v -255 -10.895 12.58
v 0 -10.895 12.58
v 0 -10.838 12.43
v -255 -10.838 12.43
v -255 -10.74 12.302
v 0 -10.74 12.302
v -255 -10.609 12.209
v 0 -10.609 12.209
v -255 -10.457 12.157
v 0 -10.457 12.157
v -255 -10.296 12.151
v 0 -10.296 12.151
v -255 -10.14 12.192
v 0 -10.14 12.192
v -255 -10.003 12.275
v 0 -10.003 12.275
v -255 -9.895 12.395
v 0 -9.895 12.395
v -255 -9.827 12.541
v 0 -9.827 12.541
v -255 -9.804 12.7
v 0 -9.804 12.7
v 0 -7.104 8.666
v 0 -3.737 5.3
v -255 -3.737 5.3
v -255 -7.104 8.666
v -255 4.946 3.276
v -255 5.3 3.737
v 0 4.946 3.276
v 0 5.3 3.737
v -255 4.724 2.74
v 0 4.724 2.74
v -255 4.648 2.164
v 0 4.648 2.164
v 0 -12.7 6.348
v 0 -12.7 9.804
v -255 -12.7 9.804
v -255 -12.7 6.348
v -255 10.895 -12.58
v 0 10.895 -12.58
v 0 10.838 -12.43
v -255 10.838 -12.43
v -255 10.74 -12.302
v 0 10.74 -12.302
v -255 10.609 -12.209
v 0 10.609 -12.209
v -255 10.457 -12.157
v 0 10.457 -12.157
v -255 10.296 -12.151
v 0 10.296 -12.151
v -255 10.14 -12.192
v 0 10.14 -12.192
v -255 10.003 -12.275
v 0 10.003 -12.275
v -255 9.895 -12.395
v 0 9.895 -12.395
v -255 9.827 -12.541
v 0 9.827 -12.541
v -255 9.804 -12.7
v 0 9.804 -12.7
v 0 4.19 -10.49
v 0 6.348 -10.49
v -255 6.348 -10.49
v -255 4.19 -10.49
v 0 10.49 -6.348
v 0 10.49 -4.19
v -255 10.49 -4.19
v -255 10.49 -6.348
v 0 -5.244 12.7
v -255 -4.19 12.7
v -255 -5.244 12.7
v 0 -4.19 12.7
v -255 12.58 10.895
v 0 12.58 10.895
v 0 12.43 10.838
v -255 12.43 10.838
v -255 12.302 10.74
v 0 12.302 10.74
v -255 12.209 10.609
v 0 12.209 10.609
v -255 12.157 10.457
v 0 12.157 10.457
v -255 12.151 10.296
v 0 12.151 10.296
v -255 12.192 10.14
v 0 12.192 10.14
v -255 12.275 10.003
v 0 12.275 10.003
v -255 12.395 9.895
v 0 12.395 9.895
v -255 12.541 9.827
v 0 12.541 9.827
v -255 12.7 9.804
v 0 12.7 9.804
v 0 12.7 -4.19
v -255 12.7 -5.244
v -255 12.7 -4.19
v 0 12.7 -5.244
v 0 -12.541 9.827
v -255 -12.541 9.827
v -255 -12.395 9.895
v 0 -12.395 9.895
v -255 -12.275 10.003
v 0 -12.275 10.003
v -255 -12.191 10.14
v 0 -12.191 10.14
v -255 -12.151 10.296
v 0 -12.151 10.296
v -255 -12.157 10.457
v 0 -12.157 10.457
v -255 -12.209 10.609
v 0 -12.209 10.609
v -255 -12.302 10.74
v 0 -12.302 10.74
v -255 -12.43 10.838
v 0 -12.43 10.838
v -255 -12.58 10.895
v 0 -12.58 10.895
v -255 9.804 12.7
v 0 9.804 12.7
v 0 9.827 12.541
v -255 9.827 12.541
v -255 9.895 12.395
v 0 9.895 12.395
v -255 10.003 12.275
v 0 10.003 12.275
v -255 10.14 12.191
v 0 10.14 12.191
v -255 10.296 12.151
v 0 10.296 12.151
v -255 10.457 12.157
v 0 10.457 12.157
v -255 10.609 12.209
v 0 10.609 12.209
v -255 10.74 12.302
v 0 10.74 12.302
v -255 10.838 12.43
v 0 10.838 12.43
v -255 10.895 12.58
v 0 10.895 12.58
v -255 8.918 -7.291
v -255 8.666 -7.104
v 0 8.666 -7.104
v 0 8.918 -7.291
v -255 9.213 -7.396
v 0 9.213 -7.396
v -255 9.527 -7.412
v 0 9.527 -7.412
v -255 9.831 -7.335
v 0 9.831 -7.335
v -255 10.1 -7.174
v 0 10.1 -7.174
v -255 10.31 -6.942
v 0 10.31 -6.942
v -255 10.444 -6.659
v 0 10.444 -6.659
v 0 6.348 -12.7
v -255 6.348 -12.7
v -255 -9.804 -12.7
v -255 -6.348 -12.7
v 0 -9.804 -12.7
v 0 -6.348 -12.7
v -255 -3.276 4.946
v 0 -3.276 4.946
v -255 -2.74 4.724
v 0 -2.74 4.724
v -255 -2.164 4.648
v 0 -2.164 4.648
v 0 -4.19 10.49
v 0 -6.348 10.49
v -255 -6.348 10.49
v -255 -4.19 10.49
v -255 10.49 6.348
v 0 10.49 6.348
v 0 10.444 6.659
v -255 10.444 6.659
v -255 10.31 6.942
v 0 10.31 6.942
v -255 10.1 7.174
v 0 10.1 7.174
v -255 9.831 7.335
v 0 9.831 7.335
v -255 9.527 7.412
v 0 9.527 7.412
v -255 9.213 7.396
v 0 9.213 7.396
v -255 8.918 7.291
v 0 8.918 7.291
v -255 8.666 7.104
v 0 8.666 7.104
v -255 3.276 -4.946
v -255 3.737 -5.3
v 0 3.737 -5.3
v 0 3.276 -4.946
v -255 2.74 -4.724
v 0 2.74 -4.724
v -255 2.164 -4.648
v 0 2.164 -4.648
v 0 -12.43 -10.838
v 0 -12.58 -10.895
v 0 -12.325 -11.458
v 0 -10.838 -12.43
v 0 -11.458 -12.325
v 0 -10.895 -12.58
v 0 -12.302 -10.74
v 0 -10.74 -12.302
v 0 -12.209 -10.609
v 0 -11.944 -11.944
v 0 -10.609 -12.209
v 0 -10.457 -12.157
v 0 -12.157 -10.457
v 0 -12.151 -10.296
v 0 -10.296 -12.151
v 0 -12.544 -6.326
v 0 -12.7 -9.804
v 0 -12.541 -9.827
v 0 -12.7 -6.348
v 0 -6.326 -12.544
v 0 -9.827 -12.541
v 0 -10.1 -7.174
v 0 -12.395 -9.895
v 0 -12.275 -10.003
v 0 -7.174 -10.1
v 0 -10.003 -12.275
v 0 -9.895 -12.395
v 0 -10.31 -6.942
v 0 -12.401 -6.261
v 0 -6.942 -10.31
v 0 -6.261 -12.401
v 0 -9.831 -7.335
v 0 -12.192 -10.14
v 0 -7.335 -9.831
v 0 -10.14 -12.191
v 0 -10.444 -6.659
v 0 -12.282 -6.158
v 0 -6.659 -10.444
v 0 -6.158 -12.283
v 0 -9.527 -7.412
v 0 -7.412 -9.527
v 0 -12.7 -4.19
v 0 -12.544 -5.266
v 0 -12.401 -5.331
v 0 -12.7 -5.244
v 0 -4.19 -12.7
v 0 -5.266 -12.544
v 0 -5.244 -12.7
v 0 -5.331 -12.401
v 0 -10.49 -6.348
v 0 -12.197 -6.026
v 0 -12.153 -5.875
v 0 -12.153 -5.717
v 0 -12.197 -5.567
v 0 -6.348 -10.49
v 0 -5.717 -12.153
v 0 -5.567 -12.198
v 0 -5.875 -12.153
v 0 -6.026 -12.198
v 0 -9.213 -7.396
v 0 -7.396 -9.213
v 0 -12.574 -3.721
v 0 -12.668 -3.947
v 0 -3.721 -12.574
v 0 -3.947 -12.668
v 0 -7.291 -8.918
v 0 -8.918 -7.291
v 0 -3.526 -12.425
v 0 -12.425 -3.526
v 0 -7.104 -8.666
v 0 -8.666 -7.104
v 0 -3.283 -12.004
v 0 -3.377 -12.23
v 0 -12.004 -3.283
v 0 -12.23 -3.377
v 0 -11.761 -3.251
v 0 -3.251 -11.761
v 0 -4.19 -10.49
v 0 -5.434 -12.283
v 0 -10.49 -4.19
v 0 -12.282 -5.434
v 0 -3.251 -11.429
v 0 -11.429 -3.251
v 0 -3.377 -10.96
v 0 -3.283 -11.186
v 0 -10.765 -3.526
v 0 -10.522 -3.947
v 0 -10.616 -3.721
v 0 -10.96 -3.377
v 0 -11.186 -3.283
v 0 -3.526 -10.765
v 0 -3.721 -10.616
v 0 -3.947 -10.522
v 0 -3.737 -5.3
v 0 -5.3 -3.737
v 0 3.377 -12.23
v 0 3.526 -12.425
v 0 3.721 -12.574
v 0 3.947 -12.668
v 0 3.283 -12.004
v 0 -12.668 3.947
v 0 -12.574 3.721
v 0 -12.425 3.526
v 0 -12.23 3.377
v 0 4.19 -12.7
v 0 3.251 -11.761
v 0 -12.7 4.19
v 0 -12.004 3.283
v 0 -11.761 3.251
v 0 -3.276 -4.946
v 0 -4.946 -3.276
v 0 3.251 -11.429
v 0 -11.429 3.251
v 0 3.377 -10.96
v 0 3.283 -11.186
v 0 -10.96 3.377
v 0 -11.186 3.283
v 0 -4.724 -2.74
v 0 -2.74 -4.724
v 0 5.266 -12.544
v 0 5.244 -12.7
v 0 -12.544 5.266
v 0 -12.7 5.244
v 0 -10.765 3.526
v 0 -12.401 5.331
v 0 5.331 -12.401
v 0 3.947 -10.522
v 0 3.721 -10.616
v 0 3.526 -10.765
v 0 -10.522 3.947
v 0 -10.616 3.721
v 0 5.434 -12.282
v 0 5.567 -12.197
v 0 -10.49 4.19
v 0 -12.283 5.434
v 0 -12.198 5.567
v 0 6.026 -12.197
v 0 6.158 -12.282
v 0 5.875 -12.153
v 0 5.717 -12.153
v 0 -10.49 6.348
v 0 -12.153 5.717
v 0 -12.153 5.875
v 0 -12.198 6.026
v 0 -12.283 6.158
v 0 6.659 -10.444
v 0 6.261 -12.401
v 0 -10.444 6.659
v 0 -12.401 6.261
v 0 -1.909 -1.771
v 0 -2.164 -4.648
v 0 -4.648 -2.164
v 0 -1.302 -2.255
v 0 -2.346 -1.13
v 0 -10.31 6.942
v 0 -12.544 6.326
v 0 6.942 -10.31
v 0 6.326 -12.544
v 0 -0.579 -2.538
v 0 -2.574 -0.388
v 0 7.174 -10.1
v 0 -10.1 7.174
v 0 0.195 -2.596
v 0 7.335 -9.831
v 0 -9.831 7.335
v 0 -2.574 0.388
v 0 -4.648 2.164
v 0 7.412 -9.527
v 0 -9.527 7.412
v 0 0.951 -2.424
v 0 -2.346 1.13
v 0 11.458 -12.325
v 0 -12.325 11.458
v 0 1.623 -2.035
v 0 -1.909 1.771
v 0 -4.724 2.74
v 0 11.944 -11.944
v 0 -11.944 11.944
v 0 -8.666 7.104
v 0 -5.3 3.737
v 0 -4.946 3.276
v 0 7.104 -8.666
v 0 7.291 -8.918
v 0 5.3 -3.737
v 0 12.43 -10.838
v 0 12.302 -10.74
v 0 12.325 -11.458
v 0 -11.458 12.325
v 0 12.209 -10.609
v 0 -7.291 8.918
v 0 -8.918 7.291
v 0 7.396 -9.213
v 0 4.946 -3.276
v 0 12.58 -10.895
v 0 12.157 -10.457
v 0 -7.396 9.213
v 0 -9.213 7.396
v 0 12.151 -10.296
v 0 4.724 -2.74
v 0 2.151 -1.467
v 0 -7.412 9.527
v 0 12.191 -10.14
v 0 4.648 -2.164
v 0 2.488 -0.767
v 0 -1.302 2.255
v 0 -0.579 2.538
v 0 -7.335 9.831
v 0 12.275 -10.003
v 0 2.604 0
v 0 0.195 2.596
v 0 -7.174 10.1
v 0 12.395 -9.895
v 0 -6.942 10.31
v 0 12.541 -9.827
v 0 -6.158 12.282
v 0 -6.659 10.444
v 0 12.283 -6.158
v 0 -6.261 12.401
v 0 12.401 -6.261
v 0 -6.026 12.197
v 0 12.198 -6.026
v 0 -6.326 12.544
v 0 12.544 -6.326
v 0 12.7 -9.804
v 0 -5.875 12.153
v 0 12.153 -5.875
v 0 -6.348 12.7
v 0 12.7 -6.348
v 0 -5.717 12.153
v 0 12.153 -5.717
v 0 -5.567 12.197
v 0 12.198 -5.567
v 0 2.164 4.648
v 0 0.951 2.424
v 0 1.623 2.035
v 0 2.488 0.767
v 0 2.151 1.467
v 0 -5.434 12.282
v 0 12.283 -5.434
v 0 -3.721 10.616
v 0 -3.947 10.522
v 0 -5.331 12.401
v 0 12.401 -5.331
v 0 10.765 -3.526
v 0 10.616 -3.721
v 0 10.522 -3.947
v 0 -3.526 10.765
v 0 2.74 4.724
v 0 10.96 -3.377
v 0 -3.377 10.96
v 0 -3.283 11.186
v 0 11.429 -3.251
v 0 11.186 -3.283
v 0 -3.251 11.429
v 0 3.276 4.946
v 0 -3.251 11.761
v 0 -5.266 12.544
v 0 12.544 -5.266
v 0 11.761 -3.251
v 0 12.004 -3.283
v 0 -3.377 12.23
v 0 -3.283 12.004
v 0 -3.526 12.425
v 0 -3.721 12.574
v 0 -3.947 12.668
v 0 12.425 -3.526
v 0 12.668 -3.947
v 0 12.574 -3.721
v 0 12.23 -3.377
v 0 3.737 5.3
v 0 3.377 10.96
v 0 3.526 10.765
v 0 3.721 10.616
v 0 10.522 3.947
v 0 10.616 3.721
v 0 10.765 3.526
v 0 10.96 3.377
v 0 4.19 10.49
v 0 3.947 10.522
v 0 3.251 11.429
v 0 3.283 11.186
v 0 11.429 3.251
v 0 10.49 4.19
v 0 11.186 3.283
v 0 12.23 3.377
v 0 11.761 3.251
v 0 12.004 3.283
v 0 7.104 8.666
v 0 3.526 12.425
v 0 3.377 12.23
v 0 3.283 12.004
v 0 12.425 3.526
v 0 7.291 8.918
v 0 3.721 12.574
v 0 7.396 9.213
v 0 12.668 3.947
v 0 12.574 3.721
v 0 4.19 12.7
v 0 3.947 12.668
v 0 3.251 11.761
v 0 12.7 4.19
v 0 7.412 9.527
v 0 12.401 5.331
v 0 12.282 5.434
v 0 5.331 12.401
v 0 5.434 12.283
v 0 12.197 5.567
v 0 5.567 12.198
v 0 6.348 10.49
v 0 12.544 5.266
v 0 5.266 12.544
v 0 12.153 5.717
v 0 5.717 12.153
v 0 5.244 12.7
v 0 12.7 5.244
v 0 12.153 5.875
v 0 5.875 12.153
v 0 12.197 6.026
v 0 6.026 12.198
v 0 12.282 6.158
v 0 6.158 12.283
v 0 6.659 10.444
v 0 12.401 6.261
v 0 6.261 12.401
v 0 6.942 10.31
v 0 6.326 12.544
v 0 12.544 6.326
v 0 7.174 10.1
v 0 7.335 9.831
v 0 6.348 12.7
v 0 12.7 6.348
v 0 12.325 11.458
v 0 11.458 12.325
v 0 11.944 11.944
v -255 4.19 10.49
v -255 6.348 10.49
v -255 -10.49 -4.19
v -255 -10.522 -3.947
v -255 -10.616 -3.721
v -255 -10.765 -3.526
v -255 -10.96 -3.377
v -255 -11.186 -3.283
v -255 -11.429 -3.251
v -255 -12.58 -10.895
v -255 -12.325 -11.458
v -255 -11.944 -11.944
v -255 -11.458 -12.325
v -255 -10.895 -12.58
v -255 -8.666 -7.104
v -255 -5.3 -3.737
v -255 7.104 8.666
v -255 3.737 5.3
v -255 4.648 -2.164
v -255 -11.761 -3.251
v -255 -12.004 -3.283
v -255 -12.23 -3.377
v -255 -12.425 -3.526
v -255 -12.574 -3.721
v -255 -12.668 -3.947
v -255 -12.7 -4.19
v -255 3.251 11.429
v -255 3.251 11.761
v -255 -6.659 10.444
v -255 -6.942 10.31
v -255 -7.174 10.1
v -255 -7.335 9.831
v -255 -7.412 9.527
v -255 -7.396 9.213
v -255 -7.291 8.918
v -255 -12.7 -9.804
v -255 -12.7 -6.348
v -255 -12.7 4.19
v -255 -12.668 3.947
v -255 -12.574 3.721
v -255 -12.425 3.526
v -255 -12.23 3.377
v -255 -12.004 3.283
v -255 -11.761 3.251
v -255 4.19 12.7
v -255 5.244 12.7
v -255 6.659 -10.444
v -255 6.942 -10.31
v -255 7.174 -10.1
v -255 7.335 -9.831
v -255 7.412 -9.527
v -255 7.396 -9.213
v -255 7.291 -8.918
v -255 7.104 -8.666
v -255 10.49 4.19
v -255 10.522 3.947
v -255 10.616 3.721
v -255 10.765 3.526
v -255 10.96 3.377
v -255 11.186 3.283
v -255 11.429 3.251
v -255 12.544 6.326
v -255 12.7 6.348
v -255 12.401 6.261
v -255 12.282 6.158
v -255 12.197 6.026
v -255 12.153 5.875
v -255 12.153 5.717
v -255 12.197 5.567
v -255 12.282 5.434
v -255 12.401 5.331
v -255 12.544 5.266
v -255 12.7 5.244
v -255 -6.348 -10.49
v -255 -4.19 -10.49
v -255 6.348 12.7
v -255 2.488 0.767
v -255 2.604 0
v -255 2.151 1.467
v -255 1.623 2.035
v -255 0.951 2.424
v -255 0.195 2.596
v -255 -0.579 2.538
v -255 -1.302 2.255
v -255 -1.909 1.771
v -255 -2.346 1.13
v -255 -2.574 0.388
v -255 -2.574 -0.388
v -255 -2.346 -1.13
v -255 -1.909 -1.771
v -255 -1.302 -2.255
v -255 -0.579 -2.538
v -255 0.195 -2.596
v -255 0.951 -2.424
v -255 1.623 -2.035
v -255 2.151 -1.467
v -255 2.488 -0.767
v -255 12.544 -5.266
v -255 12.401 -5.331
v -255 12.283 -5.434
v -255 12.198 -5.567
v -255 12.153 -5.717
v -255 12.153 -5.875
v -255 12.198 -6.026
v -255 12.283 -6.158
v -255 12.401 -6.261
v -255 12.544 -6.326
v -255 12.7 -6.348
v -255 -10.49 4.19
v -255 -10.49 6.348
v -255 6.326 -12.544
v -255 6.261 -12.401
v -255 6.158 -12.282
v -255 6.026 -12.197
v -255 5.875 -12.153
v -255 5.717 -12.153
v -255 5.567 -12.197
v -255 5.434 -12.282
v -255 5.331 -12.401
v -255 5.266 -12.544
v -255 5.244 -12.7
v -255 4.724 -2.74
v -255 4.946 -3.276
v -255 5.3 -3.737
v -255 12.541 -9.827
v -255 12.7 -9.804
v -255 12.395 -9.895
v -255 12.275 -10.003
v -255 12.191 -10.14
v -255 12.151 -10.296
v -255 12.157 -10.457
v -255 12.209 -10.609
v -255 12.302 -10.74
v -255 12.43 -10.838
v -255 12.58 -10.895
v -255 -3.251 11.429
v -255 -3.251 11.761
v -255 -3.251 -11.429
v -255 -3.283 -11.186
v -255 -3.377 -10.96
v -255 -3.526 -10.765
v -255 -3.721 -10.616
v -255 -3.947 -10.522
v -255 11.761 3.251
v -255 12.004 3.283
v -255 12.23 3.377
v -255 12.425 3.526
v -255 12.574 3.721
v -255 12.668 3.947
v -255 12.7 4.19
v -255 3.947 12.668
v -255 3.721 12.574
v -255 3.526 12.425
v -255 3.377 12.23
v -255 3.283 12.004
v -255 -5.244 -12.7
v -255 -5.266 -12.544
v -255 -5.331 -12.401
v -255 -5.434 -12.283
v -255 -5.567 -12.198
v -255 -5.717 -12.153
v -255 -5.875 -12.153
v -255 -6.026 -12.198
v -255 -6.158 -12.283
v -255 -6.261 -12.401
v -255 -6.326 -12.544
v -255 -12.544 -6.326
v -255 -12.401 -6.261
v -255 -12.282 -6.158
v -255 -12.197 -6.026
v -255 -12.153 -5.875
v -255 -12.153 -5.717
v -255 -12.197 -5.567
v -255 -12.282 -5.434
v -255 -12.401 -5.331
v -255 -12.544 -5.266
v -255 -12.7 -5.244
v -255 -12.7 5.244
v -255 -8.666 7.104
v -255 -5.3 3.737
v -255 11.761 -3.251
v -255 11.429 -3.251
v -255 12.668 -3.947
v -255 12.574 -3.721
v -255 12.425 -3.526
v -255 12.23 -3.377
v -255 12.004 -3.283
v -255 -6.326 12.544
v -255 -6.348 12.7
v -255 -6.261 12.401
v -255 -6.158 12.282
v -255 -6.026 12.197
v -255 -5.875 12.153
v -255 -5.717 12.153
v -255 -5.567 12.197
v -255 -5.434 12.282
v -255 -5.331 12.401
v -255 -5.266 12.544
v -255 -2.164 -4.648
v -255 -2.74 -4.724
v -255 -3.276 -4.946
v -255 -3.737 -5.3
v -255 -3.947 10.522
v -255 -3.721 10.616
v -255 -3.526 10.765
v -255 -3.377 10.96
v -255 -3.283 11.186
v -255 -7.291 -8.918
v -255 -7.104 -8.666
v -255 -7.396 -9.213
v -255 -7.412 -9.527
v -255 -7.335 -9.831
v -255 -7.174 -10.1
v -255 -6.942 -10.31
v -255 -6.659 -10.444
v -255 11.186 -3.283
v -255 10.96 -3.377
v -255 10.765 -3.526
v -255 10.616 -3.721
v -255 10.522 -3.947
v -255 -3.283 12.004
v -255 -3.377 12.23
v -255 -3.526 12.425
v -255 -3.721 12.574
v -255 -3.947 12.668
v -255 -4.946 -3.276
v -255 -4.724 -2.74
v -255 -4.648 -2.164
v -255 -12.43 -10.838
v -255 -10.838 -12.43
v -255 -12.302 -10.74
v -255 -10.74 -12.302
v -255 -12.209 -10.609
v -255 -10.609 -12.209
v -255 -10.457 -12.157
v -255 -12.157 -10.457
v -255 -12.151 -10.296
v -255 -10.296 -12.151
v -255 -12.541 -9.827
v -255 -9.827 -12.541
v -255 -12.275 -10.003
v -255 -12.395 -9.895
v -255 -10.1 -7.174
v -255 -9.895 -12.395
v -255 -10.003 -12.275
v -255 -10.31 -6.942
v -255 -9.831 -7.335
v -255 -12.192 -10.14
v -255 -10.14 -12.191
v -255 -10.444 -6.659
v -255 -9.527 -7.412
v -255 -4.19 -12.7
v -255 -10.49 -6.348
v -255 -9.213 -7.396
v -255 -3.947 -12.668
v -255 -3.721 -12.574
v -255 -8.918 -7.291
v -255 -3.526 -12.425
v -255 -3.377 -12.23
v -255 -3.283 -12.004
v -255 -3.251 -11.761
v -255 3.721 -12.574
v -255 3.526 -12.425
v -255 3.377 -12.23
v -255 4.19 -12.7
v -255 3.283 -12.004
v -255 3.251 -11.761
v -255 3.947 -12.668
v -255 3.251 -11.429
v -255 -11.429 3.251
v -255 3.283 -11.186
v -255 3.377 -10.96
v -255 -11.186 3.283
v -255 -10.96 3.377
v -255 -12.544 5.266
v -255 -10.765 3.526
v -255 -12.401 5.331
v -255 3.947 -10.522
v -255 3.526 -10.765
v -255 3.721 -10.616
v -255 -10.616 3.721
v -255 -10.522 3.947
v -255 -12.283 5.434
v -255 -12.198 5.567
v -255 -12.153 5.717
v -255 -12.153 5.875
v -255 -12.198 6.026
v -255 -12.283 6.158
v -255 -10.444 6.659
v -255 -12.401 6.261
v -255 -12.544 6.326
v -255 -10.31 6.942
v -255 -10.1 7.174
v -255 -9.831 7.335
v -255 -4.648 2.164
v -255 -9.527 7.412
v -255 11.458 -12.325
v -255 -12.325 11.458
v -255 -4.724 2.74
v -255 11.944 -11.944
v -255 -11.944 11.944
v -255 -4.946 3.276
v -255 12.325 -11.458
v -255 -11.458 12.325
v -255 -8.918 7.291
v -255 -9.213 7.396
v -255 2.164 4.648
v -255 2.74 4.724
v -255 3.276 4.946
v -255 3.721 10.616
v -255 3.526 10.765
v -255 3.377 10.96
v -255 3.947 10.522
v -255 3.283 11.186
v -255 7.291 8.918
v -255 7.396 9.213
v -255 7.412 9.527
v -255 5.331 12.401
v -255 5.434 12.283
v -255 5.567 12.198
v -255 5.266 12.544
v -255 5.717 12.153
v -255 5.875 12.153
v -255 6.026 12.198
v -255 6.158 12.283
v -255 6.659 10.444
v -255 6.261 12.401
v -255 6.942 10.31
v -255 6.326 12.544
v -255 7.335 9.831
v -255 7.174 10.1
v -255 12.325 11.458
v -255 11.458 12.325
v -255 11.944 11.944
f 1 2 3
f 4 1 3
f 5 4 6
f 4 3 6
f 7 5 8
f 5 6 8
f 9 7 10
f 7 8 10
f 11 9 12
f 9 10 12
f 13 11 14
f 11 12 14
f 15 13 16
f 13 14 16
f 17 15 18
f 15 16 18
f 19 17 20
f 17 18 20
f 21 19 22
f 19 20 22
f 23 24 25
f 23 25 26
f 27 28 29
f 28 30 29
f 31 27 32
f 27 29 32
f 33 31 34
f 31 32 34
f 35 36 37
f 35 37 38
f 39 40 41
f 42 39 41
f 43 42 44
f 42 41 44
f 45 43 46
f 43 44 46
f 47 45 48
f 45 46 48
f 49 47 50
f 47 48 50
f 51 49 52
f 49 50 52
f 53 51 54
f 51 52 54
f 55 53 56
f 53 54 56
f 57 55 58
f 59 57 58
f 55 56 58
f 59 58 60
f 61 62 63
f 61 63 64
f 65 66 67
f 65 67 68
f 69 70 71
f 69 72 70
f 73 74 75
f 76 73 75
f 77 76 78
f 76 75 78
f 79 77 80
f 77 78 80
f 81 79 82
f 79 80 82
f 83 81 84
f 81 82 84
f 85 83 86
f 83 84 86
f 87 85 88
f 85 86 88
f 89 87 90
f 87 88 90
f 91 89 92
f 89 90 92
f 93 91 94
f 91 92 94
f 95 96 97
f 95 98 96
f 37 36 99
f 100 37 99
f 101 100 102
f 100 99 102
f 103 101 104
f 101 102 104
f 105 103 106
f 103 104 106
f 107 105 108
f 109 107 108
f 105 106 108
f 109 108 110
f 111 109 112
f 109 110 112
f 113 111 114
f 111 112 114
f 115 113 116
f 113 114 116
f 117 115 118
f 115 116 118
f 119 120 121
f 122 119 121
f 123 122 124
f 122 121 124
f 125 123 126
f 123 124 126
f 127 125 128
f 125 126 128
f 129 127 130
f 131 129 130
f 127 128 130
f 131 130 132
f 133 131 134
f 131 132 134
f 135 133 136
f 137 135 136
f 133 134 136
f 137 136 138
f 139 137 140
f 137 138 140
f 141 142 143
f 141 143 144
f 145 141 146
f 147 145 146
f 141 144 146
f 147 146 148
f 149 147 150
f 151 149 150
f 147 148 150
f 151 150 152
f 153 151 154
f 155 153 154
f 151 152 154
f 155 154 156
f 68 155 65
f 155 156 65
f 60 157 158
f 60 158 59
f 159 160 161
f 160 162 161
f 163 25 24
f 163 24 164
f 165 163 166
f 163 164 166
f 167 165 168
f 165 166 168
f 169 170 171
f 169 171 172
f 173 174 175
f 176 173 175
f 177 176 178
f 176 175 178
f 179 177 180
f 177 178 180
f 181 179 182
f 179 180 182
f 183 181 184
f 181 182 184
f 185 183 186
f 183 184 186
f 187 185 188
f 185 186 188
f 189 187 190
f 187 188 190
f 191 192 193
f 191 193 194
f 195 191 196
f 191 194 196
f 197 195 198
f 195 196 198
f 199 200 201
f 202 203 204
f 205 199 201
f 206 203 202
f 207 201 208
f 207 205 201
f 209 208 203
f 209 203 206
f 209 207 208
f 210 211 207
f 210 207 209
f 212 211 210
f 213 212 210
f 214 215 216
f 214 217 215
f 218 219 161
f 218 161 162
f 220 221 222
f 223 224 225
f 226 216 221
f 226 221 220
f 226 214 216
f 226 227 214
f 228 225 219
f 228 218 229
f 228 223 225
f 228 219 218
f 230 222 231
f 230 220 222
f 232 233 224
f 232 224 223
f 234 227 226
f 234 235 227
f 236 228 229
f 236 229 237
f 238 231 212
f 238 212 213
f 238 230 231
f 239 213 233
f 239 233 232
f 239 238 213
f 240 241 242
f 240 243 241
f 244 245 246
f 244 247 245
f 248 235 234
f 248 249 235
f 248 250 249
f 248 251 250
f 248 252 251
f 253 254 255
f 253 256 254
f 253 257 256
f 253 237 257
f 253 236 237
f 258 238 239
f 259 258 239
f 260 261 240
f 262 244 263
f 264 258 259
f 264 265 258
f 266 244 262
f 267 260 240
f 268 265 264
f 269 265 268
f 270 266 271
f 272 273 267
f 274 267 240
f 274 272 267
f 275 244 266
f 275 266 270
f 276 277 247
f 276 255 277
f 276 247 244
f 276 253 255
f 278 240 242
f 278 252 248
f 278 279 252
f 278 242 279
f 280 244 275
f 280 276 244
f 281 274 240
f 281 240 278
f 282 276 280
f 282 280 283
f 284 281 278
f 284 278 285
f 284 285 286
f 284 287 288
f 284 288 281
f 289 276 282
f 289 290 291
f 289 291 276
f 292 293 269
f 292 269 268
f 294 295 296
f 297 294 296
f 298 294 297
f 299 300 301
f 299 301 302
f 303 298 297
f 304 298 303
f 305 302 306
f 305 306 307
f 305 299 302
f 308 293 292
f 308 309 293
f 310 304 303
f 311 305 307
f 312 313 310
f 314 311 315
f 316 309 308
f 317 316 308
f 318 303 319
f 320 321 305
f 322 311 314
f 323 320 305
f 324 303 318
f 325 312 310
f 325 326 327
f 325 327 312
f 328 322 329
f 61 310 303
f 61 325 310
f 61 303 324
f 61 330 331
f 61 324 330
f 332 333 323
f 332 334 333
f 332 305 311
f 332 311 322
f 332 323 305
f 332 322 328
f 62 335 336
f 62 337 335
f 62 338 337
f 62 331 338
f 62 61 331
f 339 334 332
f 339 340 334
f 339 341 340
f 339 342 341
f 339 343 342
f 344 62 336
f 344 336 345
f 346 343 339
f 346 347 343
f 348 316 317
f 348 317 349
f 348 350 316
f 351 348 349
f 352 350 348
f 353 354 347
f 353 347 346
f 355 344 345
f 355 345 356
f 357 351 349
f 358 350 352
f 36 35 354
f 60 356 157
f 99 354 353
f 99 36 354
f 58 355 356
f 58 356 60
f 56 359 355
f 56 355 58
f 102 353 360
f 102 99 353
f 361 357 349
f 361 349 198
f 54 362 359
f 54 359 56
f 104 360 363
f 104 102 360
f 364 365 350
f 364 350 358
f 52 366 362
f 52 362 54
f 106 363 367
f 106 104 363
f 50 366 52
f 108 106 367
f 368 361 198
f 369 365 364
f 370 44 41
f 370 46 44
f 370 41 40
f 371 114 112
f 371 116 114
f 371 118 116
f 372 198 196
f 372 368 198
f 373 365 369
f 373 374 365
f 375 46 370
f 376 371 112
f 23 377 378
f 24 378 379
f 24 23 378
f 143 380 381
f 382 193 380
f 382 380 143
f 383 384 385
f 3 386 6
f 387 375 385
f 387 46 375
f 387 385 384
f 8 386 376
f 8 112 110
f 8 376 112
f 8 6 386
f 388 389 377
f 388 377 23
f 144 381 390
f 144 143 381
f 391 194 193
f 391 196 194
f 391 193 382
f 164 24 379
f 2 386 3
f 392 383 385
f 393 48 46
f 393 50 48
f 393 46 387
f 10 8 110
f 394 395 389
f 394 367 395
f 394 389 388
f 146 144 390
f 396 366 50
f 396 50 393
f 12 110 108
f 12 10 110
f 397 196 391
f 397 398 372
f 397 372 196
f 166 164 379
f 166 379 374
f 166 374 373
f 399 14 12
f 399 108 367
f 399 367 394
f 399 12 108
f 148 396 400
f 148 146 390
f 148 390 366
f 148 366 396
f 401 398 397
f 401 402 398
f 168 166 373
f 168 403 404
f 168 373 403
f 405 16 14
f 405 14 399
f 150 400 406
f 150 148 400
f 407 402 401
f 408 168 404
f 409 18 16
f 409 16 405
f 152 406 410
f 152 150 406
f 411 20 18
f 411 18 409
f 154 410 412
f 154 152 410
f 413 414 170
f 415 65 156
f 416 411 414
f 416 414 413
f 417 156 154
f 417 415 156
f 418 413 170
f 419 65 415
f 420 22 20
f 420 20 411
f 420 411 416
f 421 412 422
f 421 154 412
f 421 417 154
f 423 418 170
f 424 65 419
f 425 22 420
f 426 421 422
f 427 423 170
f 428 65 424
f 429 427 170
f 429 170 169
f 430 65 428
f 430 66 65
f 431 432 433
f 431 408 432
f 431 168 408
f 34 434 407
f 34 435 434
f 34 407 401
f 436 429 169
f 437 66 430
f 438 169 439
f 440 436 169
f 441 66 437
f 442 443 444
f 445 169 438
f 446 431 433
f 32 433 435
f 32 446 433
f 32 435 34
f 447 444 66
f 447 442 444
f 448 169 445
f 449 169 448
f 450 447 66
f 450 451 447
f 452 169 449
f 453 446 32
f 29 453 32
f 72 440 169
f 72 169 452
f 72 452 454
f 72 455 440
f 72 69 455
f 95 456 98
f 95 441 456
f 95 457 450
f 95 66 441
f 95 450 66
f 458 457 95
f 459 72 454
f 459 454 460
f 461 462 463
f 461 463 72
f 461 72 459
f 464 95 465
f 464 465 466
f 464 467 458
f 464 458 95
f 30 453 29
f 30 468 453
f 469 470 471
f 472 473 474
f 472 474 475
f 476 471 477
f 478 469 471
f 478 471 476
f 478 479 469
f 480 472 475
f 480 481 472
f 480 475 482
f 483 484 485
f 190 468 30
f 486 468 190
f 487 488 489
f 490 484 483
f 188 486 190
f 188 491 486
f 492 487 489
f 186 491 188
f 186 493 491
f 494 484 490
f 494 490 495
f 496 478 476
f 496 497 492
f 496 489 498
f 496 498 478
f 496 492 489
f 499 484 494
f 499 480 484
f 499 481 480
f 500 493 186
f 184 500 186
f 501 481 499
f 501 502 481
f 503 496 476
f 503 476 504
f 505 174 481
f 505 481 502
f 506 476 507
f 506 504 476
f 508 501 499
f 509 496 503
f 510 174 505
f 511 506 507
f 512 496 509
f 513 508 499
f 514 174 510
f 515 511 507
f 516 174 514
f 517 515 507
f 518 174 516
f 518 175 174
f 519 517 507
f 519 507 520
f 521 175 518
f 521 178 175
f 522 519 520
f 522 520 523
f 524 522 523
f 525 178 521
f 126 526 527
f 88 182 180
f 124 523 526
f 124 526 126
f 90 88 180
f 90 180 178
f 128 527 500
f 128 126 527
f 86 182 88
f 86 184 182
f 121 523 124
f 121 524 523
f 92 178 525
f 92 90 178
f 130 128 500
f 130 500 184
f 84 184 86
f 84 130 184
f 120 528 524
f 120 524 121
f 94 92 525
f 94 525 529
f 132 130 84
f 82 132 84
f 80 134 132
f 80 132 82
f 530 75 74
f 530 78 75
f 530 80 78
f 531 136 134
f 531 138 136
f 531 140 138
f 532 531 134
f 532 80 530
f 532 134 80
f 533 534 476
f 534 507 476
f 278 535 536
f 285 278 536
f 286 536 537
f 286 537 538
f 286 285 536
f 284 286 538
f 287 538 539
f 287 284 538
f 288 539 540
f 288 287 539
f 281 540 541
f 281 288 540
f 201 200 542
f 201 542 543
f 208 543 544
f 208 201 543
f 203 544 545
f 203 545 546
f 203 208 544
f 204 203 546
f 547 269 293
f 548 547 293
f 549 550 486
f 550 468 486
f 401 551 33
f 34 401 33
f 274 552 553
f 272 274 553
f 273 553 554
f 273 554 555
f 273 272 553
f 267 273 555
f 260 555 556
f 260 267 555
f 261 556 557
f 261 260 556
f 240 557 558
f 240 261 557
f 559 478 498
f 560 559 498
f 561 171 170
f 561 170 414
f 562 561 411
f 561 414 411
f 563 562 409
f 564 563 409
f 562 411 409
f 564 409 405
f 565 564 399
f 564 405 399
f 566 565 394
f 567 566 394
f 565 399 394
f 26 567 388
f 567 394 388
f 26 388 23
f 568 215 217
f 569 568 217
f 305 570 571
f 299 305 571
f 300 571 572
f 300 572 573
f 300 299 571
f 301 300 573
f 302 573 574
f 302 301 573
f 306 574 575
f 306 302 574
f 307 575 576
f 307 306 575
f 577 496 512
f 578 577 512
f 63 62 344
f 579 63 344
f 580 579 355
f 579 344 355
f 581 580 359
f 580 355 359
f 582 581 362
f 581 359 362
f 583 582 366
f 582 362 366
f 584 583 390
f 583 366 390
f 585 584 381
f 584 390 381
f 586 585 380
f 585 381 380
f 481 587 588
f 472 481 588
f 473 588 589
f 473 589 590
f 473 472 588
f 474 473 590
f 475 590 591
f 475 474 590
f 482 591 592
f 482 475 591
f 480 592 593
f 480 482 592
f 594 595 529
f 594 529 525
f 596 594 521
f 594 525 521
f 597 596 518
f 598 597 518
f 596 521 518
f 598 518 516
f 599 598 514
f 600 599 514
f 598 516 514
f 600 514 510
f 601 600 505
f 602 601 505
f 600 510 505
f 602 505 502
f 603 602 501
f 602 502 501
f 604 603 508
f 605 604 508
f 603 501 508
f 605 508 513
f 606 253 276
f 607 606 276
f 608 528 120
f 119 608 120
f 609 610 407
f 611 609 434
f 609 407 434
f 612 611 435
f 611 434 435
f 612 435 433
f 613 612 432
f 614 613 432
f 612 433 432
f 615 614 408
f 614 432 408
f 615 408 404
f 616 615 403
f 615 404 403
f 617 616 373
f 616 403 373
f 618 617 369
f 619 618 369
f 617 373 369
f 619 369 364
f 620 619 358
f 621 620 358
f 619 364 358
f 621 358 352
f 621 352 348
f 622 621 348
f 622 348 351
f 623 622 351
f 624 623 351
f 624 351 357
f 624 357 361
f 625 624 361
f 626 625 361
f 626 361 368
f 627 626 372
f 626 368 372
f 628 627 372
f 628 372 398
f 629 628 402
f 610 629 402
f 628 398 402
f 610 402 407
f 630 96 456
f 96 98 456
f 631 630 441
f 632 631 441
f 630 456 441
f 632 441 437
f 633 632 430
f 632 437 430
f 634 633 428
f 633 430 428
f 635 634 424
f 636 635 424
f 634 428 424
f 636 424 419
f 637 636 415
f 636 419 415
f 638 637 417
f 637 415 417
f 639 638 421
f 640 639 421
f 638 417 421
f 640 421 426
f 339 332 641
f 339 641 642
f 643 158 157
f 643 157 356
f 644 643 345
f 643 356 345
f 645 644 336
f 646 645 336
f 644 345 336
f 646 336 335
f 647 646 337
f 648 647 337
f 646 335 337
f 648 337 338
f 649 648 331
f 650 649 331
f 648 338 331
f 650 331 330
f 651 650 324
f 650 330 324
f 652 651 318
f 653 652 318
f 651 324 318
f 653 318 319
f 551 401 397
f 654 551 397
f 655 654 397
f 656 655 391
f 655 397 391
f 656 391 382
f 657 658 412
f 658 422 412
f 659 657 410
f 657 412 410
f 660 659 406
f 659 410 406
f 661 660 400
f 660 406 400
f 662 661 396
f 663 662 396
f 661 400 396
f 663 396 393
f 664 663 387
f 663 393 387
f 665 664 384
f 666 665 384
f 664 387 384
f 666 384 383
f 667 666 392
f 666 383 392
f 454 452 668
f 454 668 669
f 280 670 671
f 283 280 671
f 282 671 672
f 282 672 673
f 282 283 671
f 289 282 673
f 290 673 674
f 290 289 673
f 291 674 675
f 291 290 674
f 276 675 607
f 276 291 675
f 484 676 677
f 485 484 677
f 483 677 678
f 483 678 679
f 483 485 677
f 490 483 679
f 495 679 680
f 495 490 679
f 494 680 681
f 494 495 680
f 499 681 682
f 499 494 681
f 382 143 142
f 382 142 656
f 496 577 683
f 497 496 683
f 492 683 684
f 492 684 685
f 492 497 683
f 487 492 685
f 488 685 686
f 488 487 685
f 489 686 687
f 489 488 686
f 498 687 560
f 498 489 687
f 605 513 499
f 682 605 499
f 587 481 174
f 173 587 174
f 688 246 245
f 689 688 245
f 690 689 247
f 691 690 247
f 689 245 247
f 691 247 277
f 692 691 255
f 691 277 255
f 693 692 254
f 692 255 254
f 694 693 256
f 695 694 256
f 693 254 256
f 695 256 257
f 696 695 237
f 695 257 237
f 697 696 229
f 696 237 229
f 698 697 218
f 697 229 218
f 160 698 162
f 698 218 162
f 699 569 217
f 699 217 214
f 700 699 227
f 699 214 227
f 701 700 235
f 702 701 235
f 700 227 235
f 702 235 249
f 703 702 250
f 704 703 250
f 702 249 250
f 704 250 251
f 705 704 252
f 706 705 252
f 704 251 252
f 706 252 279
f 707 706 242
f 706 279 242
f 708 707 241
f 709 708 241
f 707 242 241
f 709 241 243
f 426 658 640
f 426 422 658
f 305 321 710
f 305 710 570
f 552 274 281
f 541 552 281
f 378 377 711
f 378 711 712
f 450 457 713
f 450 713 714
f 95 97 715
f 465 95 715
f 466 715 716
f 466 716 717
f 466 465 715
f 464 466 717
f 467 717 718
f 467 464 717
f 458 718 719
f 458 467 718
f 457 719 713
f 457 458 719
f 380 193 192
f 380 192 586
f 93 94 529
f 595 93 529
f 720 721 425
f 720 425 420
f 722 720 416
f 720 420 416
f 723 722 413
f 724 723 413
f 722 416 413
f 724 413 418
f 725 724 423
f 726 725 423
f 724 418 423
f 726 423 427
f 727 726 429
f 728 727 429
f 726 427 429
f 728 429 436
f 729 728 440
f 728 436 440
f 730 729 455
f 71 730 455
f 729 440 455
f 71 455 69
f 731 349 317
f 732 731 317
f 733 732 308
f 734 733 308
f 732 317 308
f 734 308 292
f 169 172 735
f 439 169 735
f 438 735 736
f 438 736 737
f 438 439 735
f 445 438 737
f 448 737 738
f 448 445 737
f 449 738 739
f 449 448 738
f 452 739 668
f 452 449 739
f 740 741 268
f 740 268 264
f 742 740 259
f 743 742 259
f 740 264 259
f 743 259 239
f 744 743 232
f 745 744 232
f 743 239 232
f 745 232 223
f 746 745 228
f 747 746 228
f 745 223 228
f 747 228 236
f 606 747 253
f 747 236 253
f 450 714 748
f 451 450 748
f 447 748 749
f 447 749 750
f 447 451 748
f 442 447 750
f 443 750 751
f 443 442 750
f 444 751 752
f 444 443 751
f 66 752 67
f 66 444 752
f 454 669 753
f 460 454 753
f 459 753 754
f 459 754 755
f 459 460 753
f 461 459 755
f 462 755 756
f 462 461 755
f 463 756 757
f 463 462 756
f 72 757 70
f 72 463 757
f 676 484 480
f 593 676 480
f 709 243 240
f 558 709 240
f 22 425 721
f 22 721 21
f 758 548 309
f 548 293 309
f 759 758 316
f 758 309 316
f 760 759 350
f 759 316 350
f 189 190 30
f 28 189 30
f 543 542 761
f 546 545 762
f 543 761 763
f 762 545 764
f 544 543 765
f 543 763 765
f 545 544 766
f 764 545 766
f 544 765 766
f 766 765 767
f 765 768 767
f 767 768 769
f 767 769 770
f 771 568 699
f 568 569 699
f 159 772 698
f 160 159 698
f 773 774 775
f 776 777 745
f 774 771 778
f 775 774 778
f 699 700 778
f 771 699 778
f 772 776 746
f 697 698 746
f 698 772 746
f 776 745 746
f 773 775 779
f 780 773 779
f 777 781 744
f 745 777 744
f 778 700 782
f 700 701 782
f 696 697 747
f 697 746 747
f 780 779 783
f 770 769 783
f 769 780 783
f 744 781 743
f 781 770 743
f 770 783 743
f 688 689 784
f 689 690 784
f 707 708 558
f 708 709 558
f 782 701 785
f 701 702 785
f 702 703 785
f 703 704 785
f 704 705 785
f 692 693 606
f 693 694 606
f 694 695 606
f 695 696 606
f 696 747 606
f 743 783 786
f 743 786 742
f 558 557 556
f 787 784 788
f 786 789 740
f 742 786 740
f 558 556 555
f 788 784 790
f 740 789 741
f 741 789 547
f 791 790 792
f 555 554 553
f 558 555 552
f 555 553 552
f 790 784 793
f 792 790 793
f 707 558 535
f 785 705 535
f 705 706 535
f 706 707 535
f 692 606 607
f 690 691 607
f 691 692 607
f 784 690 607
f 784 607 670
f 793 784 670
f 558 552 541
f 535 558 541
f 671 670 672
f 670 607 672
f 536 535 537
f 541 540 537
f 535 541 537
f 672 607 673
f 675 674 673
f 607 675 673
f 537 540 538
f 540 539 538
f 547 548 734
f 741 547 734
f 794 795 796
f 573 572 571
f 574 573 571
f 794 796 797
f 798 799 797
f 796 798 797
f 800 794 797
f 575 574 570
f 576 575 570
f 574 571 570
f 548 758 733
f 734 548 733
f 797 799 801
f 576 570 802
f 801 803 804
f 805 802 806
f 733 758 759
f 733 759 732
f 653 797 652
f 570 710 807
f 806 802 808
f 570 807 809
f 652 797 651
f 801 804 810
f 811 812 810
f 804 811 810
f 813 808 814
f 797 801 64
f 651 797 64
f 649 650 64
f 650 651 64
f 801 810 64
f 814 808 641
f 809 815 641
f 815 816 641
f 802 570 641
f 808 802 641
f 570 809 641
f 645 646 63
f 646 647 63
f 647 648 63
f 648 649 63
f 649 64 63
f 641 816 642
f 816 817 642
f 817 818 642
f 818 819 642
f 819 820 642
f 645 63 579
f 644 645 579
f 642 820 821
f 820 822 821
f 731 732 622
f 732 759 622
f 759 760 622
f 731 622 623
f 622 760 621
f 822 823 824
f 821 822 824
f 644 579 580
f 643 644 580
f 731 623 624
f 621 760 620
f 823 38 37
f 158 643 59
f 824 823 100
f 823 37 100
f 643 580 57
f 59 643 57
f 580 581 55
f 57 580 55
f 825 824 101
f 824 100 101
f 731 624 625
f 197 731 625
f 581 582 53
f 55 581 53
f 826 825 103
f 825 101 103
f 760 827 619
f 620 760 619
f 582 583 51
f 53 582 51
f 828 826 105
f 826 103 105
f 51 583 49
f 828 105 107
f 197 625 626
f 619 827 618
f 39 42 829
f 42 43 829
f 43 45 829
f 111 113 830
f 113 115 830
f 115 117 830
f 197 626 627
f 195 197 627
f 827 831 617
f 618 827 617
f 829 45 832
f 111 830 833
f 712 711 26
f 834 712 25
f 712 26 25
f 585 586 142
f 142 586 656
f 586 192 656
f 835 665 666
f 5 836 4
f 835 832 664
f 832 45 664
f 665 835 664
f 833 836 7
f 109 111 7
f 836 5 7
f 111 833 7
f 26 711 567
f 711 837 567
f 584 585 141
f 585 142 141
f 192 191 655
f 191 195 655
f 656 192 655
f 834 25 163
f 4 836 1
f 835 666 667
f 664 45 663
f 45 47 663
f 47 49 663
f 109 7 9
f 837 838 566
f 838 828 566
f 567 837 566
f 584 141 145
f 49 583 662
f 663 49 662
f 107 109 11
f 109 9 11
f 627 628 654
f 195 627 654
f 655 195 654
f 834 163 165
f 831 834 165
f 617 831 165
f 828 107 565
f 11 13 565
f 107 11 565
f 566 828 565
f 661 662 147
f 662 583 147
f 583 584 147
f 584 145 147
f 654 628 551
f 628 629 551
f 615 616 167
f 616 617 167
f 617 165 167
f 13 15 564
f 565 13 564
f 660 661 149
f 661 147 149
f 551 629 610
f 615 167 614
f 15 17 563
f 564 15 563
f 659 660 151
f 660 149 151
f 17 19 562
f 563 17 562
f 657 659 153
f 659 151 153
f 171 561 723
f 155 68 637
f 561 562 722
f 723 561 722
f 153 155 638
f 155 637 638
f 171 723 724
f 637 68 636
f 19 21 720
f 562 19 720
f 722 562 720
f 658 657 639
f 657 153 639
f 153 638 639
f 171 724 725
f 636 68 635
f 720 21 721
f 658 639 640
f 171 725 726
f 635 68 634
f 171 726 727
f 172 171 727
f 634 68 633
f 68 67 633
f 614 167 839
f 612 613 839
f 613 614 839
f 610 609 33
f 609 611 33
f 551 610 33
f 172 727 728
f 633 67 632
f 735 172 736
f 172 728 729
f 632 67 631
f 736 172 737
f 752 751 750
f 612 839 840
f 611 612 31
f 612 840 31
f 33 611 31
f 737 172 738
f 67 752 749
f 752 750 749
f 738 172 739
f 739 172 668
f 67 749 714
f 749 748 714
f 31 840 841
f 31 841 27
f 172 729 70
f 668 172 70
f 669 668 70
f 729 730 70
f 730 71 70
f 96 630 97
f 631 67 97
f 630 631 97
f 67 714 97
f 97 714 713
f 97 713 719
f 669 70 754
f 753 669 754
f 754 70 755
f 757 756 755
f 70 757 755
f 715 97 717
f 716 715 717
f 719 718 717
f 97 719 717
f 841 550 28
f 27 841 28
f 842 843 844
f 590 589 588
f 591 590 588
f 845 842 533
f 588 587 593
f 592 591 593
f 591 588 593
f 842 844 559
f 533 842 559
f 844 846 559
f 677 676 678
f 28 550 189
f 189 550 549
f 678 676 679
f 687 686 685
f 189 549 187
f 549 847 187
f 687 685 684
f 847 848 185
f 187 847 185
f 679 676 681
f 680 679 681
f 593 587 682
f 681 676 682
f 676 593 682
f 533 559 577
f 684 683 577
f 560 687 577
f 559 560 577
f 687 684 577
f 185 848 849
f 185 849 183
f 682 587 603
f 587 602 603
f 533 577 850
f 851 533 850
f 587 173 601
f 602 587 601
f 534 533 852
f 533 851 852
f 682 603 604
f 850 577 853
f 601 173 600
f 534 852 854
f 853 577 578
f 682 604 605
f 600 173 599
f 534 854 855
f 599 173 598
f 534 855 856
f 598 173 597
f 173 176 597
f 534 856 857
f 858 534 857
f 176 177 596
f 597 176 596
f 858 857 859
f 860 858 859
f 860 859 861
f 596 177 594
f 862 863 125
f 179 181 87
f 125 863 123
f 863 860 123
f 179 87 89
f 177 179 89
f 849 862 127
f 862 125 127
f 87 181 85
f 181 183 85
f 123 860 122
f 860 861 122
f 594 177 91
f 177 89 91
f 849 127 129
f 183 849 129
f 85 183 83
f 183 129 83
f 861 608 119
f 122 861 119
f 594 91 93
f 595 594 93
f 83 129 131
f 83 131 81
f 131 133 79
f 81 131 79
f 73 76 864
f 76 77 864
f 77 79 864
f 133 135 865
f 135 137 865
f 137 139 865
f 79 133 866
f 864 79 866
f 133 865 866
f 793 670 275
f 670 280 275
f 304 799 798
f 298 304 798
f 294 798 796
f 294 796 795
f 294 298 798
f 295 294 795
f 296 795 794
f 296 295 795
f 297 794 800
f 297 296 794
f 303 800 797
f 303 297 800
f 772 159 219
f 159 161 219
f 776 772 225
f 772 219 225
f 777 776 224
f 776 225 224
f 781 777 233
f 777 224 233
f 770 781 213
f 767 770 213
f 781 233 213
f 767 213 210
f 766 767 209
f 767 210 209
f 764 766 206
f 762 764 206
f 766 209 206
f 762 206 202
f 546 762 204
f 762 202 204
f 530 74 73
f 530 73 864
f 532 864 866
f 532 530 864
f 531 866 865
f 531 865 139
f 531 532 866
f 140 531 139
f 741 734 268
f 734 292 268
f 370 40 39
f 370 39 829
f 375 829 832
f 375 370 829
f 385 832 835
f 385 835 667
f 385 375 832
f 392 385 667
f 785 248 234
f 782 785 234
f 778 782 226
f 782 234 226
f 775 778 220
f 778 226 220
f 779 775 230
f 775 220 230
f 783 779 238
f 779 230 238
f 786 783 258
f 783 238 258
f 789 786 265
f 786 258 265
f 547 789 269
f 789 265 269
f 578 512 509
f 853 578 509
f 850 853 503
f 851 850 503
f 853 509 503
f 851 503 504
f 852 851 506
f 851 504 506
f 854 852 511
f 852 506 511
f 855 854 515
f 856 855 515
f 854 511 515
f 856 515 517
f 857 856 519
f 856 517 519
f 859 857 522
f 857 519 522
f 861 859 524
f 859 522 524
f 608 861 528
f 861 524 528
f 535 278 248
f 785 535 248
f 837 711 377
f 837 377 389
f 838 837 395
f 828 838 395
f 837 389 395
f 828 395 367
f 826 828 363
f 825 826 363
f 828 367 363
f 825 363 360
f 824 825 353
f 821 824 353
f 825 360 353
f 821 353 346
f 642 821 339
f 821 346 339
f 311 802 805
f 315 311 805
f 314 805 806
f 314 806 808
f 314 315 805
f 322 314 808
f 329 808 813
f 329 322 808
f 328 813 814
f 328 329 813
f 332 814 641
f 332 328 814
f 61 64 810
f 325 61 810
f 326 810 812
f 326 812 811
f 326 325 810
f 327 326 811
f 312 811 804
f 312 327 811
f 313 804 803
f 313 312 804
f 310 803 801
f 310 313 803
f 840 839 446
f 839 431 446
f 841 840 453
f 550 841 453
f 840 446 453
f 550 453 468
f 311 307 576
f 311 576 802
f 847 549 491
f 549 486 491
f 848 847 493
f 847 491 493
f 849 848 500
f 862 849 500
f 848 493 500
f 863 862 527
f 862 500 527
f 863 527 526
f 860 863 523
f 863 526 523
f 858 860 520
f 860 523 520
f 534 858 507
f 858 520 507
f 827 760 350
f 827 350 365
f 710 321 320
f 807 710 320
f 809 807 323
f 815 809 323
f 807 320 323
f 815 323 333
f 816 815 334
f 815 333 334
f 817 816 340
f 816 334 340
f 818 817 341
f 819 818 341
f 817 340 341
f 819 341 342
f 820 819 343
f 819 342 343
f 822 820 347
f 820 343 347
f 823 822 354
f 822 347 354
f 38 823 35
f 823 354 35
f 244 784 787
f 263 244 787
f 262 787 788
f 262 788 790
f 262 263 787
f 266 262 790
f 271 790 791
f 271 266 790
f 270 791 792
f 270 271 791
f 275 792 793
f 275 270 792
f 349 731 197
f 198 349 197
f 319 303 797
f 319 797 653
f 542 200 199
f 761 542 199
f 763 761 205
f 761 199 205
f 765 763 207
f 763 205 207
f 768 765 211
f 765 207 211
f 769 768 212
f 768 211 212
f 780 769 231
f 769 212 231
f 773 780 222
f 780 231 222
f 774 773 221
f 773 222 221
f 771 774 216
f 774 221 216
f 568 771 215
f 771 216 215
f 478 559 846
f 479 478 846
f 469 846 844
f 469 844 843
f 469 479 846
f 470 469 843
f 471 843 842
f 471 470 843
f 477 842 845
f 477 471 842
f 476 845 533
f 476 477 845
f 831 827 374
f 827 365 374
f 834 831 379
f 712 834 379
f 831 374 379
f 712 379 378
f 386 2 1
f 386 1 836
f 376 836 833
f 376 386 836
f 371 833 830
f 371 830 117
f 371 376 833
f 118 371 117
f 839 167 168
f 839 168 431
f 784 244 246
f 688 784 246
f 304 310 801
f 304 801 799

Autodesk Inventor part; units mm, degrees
ref_plane "YZ Plane" through (0, 0, 0) normal (1, 0, 0) x (0, 1, 0)
ref_plane "XZ Plane" through (0, 0, 0) normal (0, 1, 0) x (-1, 0, 0)
ref_plane "XY Plane" through (0, 0, 0) normal (0, 0, 1) x (1, 0, 0)
sketch "Sketch1" plane through (0, 0, 0) normal (1, 0, 0) x (0, 1, 0)
  arc A0 (12.7, -5.2436) -> (12.7, -6.3485) centre (12.7, -5.796) ccw
  line L0 (12.7, -5.2436) -> (12.7, -4.1904)
  arc A1 (12.7, -4.1904) -> (11.7608, -3.2512) centre (11.7608, -4.1904) ccw
  line L1 (11.7608, -3.2512) -> (11.4294, -3.2512)
  arc A2 (11.4294, -3.2512) -> (10.4902, -4.1904) centre (11.4294, -4.1904) ccw
  line L2 (10.4902, -4.1904) -> (10.4902, -6.3485)
  arc A3 (8.6665, -7.1039) -> (10.4902, -6.3485) centre (9.4219, -6.3485) ccw
  line L3 (8.6665, -7.1039) -> (5.2999, -3.7373)
  arc A4 (4.6482, -2.164) -> (5.2999, -3.7373) centre (6.8732, -2.164) ccw
  line L4 (4.6482, -2.164) -> (4.6482, 2.164)
  arc A5 (5.2999, 3.7373) -> (4.6482, 2.164) centre (6.8732, 2.164) ccw
  line L5 (8.6665, 7.1039) -> (5.2999, 3.7373)
  arc A6 (10.4902, 6.3485) -> (8.6665, 7.1039) centre (9.4219, 6.3485) ccw
  line L6 (10.4902, 4.1904) -> (10.4902, 6.3485)
  arc A7 (10.4902, 4.1904) -> (11.4294, 3.2512) centre (11.4294, 4.1904) ccw
  line L7 (11.7608, 3.2512) -> (11.4294, 3.2512)
  arc A8 (11.7608, 3.2512) -> (12.7, 4.1904) centre (11.7608, 4.1904) ccw
  line L8 (12.7, 5.2436) -> (12.7, 4.1904)
  arc A9 (12.7, 6.3485) -> (12.7, 5.2436) centre (12.7, 5.796) ccw
  line L9 (12.7, 9.8037) -> (12.7, 6.3485)
  arc A10 (12.58, 10.8954) -> (12.7, 9.8037) centre (12.7, 10.3562) ccw
  arc A11 (12.58, 10.8954) -> (10.8954, 12.58) centre (10.1173, 10.1173) ccw
  arc A12 (9.8037, 12.7) -> (10.8954, 12.58) centre (10.3562, 12.7) ccw
  line L10 (6.3485, 12.7) -> (9.8037, 12.7)
  arc A13 (5.2436, 12.7) -> (6.3485, 12.7) centre (5.796, 12.7) ccw
  line L11 (4.1904, 12.7) -> (5.2436, 12.7)
  arc A14 (4.1904, 12.7) -> (3.2512, 11.7608) centre (4.1904, 11.7608) ccw
  line L12 (3.2512, 11.4294) -> (3.2512, 11.7608)
  arc A15 (3.2512, 11.4294) -> (4.1904, 10.4902) centre (4.1904, 11.4294) ccw
  line L13 (6.3485, 10.4902) -> (4.1904, 10.4902)
  arc A16 (7.1039, 8.6665) -> (6.3485, 10.4902) centre (6.3485, 9.4219) ccw
  line L14 (3.7373, 5.2999) -> (7.1039, 8.6665)
  arc A17 (2.164, 4.6482) -> (3.7373, 5.2999) centre (2.164, 6.8732) ccw
  line L15 (-2.164, 4.6482) -> (2.164, 4.6482)
  arc A18 (-3.7373, 5.2999) -> (-2.164, 4.6482) centre (-2.164, 6.8732) ccw
  line L16 (-3.7373, 5.2999) -> (-7.1039, 8.6665)
  arc A19 (-6.3485, 10.4902) -> (-7.1039, 8.6665) centre (-6.3485, 9.4219) ccw
  line L17 (-6.3485, 10.4902) -> (-4.1904, 10.4902)
  arc A20 (-4.1904, 10.4902) -> (-3.2512, 11.4294) centre (-4.1904, 11.4294) ccw
  line L18 (-3.2512, 11.4294) -> (-3.2512, 11.7608)
  arc A21 (-3.2512, 11.7608) -> (-4.1904, 12.7) centre (-4.1904, 11.7608) ccw
  line L19 (-4.1904, 12.7) -> (-5.2436, 12.7)
  arc A22 (-6.3485, 12.7) -> (-5.2436, 12.7) centre (-5.796, 12.7) ccw
  line L20 (-6.3485, 12.7) -> (-9.8037, 12.7)
  arc A23 (-10.8954, 12.58) -> (-9.8037, 12.7) centre (-10.3562, 12.7) ccw
  arc A24 (-10.8954, 12.58) -> (-12.58, 10.8954) centre (-10.1173, 10.1173) ccw
  arc A25 (-12.7, 9.8037) -> (-12.58, 10.8954) centre (-12.7, 10.3562) ccw
  line L21 (-12.7, 9.8037) -> (-12.7, 6.3485)
  arc A26 (-12.7, 5.2436) -> (-12.7, 6.3485) centre (-12.7, 5.796) ccw
  line L22 (-12.7, 5.2436) -> (-12.7, 4.1904)
  arc A27 (-12.7, 4.1904) -> (-11.7608, 3.2512) centre (-11.7608, 4.1904) ccw
  line L23 (-11.7608, 3.2512) -> (-11.4294, 3.2512)
  arc A28 (-11.4294, 3.2512) -> (-10.4902, 4.1904) centre (-11.4294, 4.1904) ccw
  line L24 (-10.4902, 4.1904) -> (-10.4902, 6.3485)
  arc A29 (-8.6665, 7.1039) -> (-10.4902, 6.3485) centre (-9.4219, 6.3485) ccw
  line L25 (-8.6665, 7.1039) -> (-5.2999, 3.7373)
  arc A30 (-4.6482, 2.164) -> (-5.2999, 3.7373) centre (-6.8732, 2.164) ccw
  line L26 (-4.6482, -2.164) -> (-4.6482, 2.164)
  arc A31 (-5.2999, -3.7373) -> (-4.6482, -2.164) centre (-6.8732, -2.164) ccw
  line L27 (-8.6665, -7.1039) -> (-5.2999, -3.7373)
  arc A32 (-10.4902, -6.3485) -> (-8.6665, -7.1039) centre (-9.4219, -6.3485) ccw
  line L28 (-10.4902, -4.1904) -> (-10.4902, -6.3485)
  arc A33 (-10.4902, -4.1904) -> (-11.4294, -3.2512) centre (-11.4294, -4.1904) ccw
  line L29 (-11.7608, -3.2512) -> (-11.4294, -3.2512)
  arc A34 (-11.7608, -3.2512) -> (-12.7, -4.1904) centre (-11.7608, -4.1904) ccw
  line L30 (-12.7, -5.2436) -> (-12.7, -4.1904)
  arc A35 (-12.7, -6.3485) -> (-12.7, -5.2436) centre (-12.7, -5.796) ccw
  line L31 (-12.7, -9.8037) -> (-12.7, -6.3485)
  arc A36 (-12.58, -10.8954) -> (-12.7, -9.8037) centre (-12.7, -10.3562) ccw
  arc A37 (-12.58, -10.8954) -> (-10.8954, -12.58) centre (-10.1173, -10.1173) ccw
  arc A38 (-9.8037, -12.7) -> (-10.8954, -12.58) centre (-10.3562, -12.7) ccw
  line L32 (-6.3485, -12.7) -> (-9.8037, -12.7)
  arc A39 (-5.2436, -12.7) -> (-6.3485, -12.7) centre (-5.796, -12.7) ccw
  line L33 (-4.1904, -12.7) -> (-5.2436, -12.7)
  arc A40 (-4.1904, -12.7) -> (-3.2512, -11.7608) centre (-4.1904, -11.7608) ccw
  line L34 (-3.2512, -11.4294) -> (-3.2512, -11.7608)
  arc A41 (-3.2512, -11.4294) -> (-4.1904, -10.4902) centre (-4.1904, -11.4294) ccw
  line L35 (-6.3485, -10.4902) -> (-4.1904, -10.4902)
  arc A42 (-7.1039, -8.6665) -> (-6.3485, -10.4902) centre (-6.3485, -9.4219) ccw
  line L36 (-3.7373, -5.2999) -> (-7.1039, -8.6665)
  arc A43 (-2.164, -4.6482) -> (-3.7373, -5.2999) centre (-2.164, -6.8732) ccw
  line L37 (-2.164, -4.6482) -> (2.164, -4.6482)
  arc A44 (3.7373, -5.2999) -> (2.164, -4.6482) centre (2.164, -6.8732) ccw
  line L38 (3.7373, -5.2999) -> (7.1039, -8.6665)
  arc A45 (6.3485, -10.4902) -> (7.1039, -8.6665) centre (6.3485, -9.4219) ccw
  line L39 (6.3485, -10.4902) -> (4.1904, -10.4902)
  arc A46 (4.1904, -10.4902) -> (3.2512, -11.4294) centre (4.1904, -11.4294) ccw
  line L40 (3.2512, -11.4294) -> (3.2512, -11.7608)
  arc A47 (3.2512, -11.7608) -> (4.1904, -12.7) centre (4.1904, -11.7608) ccw
  line L41 (4.1904, -12.7) -> (5.2436, -12.7)
  arc A48 (6.3485, -12.7) -> (5.2436, -12.7) centre (5.796, -12.7) ccw
  line L42 (6.3485, -12.7) -> (9.8037, -12.7)
  arc A49 (10.8954, -12.58) -> (9.8037, -12.7) centre (10.3562, -12.7) ccw
  arc A50 (10.8954, -12.58) -> (12.58, -10.8954) centre (10.1173, -10.1173) ccw
  arc A51 (12.7, -9.8037) -> (12.58, -10.8954) centre (12.7, -10.3562) ccw
  line L43 (12.7, -9.8037) -> (12.7, -6.3485)
  circle A52 centre (0, 0) radius 2.6035
  point P0 (0, 0)
  point P1 (0, 0)
extrude "Extrusion1" add sketch "Sketch1" against normal blind 255
properties part number "horizontalStrut" material "Aluminum 6061"
